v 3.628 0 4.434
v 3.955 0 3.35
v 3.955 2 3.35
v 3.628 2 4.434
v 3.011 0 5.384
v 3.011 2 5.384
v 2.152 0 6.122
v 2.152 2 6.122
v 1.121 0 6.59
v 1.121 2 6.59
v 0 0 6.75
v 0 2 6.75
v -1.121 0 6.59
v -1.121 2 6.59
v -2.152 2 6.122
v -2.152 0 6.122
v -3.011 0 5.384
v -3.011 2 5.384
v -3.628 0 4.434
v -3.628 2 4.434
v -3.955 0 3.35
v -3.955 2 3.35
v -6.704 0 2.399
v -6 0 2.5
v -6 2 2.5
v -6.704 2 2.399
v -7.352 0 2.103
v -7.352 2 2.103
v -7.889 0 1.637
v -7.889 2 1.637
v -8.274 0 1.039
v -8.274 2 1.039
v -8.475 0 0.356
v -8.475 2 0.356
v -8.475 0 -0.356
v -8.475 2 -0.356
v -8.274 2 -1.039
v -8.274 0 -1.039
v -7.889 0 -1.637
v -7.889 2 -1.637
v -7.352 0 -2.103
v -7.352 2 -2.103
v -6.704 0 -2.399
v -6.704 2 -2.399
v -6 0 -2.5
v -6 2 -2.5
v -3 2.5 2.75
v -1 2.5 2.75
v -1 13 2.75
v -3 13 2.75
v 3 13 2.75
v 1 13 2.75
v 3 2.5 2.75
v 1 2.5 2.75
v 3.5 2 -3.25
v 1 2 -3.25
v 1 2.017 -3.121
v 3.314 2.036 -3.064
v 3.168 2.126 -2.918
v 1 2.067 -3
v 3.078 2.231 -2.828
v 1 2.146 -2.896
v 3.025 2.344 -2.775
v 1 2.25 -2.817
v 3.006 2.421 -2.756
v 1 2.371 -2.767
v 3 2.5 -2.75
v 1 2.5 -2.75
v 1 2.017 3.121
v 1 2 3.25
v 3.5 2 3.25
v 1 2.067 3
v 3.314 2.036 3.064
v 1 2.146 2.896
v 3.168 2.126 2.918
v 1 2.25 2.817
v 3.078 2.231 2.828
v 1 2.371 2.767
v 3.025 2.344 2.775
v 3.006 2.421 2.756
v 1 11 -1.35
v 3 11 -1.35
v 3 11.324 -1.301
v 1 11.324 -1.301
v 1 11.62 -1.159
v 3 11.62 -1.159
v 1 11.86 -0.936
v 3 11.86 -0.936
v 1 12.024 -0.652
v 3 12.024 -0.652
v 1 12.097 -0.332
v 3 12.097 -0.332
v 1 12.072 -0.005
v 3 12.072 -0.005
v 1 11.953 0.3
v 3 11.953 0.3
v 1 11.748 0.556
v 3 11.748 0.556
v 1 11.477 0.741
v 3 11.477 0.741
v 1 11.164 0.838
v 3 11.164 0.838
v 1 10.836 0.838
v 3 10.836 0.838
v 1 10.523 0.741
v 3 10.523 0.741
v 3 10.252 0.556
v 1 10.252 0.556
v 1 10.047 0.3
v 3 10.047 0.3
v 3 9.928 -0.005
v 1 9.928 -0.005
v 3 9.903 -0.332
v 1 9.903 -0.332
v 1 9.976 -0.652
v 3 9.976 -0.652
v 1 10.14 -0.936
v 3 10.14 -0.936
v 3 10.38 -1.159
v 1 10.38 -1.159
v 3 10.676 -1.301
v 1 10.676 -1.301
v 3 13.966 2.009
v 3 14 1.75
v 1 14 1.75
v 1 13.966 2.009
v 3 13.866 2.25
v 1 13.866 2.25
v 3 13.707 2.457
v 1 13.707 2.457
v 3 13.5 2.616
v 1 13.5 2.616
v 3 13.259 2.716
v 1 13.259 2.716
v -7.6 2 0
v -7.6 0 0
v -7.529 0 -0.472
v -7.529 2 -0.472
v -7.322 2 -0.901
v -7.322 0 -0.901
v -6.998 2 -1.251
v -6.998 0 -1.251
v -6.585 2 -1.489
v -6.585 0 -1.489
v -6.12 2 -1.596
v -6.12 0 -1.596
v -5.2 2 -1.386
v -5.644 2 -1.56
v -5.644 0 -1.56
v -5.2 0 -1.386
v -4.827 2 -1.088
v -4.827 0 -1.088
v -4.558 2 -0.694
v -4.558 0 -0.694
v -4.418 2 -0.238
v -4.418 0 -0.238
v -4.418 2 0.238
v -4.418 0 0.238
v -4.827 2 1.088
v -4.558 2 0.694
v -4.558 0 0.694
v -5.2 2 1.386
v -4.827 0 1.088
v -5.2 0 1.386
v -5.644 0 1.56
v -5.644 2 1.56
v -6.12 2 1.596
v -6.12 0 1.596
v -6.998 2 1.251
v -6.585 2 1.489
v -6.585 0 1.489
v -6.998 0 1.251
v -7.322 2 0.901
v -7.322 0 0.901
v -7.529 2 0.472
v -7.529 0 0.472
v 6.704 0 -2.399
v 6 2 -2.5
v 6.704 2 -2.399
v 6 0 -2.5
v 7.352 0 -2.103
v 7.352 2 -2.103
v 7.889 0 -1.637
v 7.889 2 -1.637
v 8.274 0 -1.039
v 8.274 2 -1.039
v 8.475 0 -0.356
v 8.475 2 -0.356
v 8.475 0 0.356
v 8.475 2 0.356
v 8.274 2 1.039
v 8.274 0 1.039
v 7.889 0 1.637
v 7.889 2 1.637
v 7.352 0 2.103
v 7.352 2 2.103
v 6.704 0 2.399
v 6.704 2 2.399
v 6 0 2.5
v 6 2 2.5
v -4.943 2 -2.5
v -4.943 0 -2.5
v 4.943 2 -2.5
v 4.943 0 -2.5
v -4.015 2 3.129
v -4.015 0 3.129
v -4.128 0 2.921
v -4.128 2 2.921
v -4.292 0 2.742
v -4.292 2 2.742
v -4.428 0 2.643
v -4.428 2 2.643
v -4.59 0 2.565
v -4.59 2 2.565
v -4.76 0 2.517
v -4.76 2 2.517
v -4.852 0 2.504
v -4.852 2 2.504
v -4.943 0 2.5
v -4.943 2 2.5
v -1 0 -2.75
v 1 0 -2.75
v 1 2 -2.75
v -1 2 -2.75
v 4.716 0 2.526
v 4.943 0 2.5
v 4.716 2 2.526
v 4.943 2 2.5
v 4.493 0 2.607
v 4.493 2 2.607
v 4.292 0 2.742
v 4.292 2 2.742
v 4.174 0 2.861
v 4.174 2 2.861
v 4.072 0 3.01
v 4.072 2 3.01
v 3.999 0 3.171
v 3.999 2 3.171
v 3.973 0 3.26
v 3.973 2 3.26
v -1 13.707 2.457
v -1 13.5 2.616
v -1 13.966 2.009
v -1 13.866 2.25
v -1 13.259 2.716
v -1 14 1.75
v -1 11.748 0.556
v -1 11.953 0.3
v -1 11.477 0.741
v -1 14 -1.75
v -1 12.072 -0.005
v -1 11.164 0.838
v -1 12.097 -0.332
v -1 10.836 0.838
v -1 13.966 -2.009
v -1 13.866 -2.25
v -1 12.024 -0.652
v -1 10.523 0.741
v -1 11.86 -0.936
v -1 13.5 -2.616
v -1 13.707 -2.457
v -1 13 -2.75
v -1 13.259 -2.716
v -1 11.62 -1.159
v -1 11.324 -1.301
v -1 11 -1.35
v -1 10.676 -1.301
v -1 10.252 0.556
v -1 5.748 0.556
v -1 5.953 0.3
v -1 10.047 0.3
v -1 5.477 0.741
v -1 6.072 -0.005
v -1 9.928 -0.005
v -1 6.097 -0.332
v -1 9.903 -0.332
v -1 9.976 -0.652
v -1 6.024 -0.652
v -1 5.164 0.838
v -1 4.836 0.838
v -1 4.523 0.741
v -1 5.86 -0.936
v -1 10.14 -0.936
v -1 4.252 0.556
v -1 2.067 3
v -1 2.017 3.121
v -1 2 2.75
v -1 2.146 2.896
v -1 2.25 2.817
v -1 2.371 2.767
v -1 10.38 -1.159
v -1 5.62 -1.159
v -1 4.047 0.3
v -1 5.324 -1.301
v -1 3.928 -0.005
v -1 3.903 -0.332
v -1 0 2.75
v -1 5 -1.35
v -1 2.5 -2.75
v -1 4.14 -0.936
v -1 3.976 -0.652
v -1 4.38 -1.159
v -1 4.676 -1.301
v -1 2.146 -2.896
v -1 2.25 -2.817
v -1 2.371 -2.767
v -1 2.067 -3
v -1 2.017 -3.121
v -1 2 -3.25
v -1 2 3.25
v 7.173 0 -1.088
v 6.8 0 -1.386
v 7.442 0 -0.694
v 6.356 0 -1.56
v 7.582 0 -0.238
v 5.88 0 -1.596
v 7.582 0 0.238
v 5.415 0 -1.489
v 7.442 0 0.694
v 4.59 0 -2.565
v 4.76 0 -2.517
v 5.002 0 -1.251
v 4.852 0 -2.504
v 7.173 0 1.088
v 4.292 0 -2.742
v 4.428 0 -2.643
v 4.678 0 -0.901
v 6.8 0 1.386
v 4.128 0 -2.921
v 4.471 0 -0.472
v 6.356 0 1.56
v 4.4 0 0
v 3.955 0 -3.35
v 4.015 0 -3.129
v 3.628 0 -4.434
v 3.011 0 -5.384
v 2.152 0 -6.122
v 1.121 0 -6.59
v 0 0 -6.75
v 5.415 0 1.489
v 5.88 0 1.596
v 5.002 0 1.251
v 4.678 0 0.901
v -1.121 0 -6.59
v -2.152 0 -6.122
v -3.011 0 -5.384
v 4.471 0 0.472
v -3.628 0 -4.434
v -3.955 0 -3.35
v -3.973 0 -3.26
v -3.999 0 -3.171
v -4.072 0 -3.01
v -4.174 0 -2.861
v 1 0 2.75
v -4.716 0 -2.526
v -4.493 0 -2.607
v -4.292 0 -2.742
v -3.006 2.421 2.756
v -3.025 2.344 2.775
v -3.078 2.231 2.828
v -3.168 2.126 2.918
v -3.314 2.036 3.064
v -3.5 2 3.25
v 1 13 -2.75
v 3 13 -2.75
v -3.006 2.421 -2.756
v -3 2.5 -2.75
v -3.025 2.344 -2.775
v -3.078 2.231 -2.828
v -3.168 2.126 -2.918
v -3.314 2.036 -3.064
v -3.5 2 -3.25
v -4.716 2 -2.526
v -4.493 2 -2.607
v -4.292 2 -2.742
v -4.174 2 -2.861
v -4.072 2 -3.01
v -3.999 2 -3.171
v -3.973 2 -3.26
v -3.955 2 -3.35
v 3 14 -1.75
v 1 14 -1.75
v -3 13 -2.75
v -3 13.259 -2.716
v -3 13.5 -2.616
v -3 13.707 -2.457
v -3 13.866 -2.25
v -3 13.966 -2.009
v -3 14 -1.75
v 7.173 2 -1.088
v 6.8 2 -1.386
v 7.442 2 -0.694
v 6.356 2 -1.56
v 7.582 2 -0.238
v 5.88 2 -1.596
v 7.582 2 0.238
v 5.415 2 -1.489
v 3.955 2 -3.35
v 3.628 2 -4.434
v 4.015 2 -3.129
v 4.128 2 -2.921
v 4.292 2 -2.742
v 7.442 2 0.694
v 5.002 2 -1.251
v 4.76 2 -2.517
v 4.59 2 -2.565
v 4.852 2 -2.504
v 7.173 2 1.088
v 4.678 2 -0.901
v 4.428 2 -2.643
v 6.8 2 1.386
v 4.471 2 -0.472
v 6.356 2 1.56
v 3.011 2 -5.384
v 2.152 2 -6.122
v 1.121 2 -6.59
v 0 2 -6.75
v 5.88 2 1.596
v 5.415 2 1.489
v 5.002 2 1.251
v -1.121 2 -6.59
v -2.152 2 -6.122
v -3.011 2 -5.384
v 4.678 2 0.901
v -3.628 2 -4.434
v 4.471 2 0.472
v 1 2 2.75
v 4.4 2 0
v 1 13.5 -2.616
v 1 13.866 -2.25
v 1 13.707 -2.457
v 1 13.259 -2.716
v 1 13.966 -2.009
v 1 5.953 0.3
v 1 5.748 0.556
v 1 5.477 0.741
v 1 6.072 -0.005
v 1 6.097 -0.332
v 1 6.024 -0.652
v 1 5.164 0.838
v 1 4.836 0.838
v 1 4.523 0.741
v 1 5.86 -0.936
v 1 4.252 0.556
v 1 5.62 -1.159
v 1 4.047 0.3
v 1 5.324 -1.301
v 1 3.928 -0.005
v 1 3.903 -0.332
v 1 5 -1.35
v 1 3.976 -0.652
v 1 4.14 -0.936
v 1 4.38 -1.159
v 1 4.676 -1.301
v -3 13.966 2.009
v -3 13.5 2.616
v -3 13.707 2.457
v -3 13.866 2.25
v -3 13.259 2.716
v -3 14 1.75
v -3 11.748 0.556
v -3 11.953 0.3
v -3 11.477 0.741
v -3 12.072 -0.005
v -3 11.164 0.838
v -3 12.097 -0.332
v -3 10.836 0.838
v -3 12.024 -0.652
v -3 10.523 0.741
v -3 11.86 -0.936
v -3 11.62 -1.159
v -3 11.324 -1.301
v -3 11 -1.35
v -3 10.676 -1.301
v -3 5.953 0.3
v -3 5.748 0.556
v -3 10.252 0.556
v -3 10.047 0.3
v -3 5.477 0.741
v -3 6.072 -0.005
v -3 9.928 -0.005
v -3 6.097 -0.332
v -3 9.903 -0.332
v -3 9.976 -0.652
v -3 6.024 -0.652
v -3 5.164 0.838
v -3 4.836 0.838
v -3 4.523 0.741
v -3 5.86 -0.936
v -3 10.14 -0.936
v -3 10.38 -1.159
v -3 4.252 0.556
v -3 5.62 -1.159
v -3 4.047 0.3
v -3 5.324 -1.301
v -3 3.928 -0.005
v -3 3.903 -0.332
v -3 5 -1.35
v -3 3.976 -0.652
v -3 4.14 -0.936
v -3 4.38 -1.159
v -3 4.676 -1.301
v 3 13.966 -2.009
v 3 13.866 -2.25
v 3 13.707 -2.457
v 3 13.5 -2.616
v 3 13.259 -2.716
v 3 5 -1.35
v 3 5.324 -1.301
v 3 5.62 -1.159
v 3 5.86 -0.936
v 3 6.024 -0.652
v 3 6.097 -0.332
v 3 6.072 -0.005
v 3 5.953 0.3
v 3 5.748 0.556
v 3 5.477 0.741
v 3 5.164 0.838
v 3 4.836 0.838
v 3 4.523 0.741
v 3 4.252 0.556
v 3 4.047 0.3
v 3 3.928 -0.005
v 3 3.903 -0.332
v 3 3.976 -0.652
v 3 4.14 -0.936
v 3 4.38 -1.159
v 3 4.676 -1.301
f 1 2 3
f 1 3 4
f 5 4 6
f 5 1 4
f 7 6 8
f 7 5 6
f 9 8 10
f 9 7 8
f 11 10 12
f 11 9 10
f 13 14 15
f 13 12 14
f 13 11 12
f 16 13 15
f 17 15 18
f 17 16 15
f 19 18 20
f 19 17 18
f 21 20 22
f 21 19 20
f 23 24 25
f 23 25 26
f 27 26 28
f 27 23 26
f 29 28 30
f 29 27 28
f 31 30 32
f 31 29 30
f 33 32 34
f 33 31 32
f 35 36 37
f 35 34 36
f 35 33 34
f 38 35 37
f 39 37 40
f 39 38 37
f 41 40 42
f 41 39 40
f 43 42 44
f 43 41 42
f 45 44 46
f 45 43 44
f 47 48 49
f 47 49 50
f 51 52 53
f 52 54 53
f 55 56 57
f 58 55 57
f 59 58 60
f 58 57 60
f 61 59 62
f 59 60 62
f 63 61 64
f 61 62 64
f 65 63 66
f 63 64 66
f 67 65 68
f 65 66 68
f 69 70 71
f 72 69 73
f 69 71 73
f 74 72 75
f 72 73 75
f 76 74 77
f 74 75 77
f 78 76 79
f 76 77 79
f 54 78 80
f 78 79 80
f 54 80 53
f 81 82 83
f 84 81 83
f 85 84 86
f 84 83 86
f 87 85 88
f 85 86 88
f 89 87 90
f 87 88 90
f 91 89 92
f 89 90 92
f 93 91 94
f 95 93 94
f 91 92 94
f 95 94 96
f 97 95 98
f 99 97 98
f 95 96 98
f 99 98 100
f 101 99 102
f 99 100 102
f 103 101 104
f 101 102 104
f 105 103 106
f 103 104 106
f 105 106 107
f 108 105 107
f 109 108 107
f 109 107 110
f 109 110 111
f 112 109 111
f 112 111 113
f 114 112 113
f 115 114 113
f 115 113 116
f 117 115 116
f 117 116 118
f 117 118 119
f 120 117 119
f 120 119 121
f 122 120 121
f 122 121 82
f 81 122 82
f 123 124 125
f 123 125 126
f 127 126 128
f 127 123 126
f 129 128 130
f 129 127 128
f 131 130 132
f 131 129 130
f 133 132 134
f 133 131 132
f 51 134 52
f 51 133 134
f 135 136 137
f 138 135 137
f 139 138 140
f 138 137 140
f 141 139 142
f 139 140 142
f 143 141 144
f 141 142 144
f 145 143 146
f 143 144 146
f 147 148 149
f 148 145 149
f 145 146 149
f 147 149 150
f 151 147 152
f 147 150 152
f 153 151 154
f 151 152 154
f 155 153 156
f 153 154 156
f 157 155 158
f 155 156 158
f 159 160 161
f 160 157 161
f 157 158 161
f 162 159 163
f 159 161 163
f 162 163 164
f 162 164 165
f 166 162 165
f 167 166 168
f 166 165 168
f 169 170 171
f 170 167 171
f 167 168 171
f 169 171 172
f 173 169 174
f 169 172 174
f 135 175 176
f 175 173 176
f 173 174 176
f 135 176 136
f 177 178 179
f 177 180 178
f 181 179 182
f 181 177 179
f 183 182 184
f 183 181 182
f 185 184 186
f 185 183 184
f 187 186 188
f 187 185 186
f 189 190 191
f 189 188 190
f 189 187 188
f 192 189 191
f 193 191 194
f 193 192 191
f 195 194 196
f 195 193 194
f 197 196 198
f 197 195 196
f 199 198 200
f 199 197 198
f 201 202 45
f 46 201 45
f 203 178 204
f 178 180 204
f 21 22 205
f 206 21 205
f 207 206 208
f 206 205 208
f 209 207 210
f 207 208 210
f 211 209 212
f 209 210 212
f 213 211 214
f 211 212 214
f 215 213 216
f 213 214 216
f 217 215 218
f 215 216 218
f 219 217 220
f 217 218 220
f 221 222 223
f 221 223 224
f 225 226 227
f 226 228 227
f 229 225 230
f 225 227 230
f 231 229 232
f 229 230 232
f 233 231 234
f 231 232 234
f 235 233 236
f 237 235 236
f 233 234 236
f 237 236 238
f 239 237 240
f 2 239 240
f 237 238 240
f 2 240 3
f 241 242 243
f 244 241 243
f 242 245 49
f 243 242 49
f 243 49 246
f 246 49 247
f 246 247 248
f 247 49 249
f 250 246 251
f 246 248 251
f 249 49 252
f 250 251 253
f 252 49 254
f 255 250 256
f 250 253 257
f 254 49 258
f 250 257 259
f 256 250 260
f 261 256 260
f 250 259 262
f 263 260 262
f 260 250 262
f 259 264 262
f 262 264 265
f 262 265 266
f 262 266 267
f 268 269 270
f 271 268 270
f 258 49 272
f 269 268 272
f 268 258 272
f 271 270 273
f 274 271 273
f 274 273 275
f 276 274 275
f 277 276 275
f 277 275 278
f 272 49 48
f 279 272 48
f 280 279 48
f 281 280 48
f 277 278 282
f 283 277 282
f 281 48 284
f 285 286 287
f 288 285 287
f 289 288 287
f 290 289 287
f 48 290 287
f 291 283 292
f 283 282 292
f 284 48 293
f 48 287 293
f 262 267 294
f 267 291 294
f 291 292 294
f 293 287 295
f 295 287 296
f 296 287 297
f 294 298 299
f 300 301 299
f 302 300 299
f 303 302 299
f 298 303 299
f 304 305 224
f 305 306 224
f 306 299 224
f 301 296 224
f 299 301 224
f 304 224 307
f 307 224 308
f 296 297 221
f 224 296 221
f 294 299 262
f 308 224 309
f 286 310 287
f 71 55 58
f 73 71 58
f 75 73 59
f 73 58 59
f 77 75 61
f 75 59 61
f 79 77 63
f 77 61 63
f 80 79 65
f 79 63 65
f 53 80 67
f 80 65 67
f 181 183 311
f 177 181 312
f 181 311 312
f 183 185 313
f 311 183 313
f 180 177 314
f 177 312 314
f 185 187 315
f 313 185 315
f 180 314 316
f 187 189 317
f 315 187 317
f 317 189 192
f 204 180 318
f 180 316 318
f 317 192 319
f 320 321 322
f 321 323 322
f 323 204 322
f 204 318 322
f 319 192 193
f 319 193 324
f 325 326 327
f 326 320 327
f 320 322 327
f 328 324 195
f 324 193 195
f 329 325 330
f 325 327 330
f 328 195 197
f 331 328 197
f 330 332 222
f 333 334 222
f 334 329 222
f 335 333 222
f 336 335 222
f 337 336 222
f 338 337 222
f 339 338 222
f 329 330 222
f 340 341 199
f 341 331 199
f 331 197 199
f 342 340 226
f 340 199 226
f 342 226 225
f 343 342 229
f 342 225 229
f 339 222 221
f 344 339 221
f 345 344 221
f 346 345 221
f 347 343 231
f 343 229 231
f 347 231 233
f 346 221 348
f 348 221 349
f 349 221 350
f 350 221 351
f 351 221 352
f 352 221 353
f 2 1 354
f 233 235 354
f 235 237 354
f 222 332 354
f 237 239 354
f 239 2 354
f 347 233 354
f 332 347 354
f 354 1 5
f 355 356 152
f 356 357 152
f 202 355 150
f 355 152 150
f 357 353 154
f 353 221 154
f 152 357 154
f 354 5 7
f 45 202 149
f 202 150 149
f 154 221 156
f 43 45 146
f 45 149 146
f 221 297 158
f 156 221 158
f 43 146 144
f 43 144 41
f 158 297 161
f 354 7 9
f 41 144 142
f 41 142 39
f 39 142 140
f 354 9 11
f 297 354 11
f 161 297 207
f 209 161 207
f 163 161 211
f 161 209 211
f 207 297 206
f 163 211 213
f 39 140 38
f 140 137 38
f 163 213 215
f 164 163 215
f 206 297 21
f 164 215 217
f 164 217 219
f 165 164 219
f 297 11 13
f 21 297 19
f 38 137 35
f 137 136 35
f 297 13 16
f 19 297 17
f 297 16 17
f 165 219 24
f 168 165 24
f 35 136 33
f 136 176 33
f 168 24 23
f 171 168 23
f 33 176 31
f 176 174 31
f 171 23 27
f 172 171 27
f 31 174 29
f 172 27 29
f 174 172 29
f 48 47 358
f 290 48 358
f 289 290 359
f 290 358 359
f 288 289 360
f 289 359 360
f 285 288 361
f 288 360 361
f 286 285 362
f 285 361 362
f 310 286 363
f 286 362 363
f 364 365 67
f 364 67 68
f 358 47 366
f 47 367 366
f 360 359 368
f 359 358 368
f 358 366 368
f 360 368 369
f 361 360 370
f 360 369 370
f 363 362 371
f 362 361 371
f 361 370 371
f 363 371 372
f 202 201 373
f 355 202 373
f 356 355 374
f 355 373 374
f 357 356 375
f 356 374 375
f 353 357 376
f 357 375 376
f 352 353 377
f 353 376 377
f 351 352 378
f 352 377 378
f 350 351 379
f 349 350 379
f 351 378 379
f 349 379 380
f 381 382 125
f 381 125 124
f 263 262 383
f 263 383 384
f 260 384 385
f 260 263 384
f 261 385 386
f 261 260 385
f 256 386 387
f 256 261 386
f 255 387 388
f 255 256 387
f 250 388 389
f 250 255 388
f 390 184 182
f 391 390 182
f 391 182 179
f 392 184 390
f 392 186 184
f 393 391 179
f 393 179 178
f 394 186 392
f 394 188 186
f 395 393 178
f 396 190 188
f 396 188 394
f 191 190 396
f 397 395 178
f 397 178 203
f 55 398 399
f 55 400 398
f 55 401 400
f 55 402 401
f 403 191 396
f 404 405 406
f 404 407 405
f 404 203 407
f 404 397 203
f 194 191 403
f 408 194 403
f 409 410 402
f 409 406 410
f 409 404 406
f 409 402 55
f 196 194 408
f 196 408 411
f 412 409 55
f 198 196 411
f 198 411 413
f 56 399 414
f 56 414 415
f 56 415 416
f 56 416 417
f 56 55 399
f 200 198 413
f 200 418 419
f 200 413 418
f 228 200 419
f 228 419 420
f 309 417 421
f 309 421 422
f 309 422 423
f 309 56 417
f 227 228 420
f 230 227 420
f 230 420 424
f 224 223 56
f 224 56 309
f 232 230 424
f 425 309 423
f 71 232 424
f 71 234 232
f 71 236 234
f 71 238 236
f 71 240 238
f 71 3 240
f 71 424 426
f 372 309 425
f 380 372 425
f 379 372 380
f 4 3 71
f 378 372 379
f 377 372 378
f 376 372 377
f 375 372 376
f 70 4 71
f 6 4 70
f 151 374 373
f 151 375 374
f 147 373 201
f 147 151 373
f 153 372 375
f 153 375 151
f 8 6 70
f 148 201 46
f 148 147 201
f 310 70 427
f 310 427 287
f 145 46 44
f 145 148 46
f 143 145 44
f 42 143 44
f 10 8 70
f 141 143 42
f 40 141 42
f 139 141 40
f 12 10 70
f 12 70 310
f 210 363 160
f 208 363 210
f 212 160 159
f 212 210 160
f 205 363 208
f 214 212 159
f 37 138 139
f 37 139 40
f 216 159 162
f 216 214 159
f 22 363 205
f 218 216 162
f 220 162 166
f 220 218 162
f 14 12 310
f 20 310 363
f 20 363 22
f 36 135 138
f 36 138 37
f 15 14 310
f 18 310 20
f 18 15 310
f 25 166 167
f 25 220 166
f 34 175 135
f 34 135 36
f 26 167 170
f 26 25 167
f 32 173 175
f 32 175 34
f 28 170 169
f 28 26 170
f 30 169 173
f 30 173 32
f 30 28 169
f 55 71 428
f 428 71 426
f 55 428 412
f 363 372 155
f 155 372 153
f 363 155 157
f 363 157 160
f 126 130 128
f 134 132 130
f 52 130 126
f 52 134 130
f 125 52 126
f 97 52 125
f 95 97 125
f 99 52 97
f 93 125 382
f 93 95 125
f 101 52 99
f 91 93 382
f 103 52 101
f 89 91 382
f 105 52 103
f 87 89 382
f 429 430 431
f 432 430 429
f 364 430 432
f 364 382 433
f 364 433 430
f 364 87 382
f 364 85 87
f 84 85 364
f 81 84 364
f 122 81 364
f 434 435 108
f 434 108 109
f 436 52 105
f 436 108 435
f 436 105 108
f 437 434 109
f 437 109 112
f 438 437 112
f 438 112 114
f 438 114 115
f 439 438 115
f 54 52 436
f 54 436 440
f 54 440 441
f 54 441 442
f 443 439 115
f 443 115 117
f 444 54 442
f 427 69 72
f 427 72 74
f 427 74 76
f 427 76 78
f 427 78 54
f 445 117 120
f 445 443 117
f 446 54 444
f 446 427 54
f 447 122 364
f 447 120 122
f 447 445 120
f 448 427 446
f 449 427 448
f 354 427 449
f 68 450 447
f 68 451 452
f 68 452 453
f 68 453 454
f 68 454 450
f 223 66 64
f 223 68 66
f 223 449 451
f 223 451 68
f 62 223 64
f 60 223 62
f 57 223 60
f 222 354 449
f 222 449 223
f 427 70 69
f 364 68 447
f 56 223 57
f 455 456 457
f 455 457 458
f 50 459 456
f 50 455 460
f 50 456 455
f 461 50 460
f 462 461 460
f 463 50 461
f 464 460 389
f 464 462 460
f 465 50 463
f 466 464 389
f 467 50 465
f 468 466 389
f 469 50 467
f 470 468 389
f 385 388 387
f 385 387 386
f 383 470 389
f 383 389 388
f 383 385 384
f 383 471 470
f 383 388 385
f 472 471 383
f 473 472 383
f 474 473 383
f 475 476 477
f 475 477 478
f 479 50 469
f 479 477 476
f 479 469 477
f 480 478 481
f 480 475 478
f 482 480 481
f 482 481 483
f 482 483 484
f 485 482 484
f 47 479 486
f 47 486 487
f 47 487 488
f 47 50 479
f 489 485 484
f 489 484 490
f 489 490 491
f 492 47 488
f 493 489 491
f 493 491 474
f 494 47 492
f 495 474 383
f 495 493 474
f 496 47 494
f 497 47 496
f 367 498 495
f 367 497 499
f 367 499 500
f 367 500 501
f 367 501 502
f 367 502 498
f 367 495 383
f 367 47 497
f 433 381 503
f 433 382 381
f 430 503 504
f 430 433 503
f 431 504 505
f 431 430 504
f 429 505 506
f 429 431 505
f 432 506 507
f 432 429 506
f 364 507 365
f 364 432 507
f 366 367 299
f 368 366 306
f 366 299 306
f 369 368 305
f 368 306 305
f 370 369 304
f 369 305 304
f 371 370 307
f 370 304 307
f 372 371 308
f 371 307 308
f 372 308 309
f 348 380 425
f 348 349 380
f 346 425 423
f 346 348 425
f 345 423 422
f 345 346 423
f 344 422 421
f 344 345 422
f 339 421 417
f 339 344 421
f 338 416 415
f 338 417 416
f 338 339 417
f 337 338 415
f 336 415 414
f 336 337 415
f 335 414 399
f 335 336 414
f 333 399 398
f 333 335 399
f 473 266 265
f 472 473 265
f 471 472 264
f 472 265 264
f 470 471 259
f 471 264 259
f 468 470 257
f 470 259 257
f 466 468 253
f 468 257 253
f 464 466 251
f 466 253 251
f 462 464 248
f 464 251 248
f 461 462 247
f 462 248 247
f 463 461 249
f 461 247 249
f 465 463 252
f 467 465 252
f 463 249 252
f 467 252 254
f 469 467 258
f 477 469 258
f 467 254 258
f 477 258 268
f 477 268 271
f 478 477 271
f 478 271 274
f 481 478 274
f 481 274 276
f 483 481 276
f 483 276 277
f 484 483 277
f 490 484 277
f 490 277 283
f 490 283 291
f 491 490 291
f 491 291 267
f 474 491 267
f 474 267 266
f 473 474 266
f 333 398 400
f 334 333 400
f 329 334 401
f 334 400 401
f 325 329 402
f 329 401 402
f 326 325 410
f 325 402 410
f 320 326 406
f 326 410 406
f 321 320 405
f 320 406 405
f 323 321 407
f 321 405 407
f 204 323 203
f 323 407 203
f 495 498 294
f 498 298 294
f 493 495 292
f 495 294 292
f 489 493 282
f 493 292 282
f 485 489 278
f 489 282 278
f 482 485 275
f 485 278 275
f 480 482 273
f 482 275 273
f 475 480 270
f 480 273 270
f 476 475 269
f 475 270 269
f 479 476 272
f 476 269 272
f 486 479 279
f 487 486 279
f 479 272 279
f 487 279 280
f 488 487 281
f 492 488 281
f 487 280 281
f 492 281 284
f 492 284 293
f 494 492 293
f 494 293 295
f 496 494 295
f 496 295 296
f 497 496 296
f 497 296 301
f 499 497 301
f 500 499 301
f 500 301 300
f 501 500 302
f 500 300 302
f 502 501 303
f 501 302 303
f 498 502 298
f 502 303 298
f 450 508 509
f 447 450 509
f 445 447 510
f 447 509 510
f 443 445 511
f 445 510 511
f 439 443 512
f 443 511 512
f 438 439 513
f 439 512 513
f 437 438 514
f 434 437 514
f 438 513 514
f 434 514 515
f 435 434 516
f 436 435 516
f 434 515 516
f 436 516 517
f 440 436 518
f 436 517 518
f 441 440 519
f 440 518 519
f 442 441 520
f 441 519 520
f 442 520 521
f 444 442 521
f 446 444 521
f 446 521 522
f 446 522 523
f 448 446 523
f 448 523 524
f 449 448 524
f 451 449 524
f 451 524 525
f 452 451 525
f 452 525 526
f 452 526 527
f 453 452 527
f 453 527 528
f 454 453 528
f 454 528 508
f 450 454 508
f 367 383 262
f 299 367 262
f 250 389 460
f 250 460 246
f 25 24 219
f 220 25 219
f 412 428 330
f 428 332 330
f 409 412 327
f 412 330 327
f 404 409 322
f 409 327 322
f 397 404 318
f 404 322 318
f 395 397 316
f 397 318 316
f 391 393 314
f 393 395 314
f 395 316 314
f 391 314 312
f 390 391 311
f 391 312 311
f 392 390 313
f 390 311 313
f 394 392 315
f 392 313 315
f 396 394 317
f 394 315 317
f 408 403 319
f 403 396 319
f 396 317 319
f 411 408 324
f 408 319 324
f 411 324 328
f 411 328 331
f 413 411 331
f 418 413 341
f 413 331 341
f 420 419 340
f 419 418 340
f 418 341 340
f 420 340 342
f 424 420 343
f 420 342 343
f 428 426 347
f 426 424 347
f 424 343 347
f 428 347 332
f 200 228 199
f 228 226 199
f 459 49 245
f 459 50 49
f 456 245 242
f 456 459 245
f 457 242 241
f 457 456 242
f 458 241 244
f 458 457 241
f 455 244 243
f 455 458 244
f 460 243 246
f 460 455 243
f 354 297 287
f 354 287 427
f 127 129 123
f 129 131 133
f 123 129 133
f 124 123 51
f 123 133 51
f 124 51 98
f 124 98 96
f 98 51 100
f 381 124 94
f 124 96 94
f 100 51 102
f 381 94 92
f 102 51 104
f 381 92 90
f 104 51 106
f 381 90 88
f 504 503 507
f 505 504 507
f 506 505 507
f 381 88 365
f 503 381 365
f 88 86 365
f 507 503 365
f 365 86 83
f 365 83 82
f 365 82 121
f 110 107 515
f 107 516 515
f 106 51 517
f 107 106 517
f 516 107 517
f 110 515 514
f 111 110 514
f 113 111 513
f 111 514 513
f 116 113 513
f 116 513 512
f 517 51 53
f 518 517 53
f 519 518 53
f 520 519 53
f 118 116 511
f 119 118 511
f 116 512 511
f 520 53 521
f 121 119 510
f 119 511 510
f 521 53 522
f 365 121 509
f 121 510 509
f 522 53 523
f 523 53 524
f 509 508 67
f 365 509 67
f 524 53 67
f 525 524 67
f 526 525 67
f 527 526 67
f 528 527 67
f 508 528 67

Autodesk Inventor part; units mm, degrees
ref_plane "YZ Plane" through (0, 0, 0) normal (1, 0, 0) x (0, 1, 0)
ref_plane "XZ Plane" through (0, 0, 0) normal (0, 1, 0) x (-1, 0, 0)
ref_plane "XY Plane" through (0, 0, 0) normal (0, 0, 1) x (1, 0, 0)
sketch "Sketch1" plane through (0, 0, 0) normal (0, 1, 0) x (-1, 0, 0)
  circle A0 centre (6, 0) radius 1.6
  circle A1 centre (6, 0) radius 1.6
  circle A2 centre (-6, 0) radius 1.6
  circle A3 centre (-6, 0) radius 1.6
  line L0 (1, 2.75) -> (1, -2.75) construction
  line L1 (1, 2.75) -> (-1, 2.75)
  line L2 (-1, -2.75) -> (-1, 2.75) construction
  line L3 (-1, -2.75) -> (1, -2.75)
  line L4 (0, 2.75) -> (0, -2.75) construction
  line L5 (-1, -2.75) -> (-3, -2.75)
  line L6 (-3, -2.75) -> (-3, 2.75)
  line L7 (-3, 2.75) -> (-1, 2.75)
  line L8 (-1, 2.75) -> (-1, -2.75)
  line L9 (1, -2.75) -> (3, -2.75)
  line L10 (3, -2.75) -> (3, 2.75)
  line L11 (3, 2.75) -> (1, 2.75)
  line L12 (1, 2.75) -> (1, -2.75)
  line L13 (6, 0) -> (-6, 0) construction
  arc A4 (6, -2.5) -> (6, 2.5) centre (6, 0) ccw
  arc A5 (-6, 2.5) -> (-6, -2.5) centre (-6, 0) ccw
  line L14 (0, 2.75) -> (0, -2.75) construction
  arc A6 (4, 2.75) -> (-4, 2.75) centre (0, 2.75) ccw
  arc A7 (-4, -2.75) -> (4, -2.75) centre (0, -2.75) ccw
  line L15 (4, -2.75) -> (4, -2.5)
  line L16 (4, 2.5) -> (4, 2.75)
  line L17 (-4, 2.75) -> (-4, 2.5)
  line L18 (-4, -2.5) -> (-4, -2.75)
  line L19 (-6, -2.5) -> (-4, -2.5)
  line L20 (4, -2.5) -> (6, -2.5)
  line L21 (6, 2.5) -> (4, 2.5)
  line L22 (-4, 2.5) -> (-6, 2.5)
  point P0 (0, 0)
  point P1 (0, 0)
  point P2 (0, 0)
  point P3 (0, 0)
  point P4 (0, 0)
  point P5 (0, 0)
  dimension "d6" = 2
  dimension "d7" = 2
  dimension "d8" = 5
  dimension "d9" = 8
extrude "Extrusion1" add sketch "Sketch1" along normal blind 2 contours L11 L10 L9 L12 | L8 L5 L6 L7 | L20 L15 A7 L18 L19 A5 L22 L17 A6 L16 L21 A4
fillet "Fillet1" radius 1 4 edges at (4, 1, -2.5) (4, 1, 2.5) (-4, 1, -2.5) (-4, 1, 2.5)
sketch "Sketch3" plane through (0, 2, 0) normal (0, 1, 0) x (1, 0, 0)
  line L0 (1, -2.75) -> (-1, -2.75) projected
  line L1 (1, -2.75) -> (3, -2.75)
  line L2 (3, -2.75) -> (3, 2.75)
  line L3 (3, 2.75) -> (1, 2.75)
  line L4 (1, 2.75) -> (1, -2.75)
  line L5 (-1, -2.75) -> (-3, -2.75)
  line L6 (-3, -2.75) -> (-3, 2.75)
  line L7 (-3, 2.75) -> (-1, 2.75)
  line L8 (-1, 2.75) -> (-1, -2.75)
  point P0 (0, 0)
  dimension "d11" = 2
  dimension "d12" = 5.5
  dimension "d13" = 2
extrude "Extrusion2" add sketch "Sketch3" along normal blind 12
fillet "Fillet2" radius 0.5 6 edges at (2, 2, -2.75) (-2, 2, -2.75) (-3, 2, 0) (3, 2, 0) (2, 2, 2.75) (-2, 2, 2.75)
sketch "Sketch4" plane through (3, 14, 2.75) normal (1, 0, 0) x (0, 0, -1)
  line L0 (5.5, 0) -> (0.5, 0) construction
  line L1 (5.5, -12) -> (5.5, 0) construction
  line L2 (0.5, 0) -> (5.5, -12) construction
  line L3 (3, -6) -> (3, -9) construction
  line L4 (3, -6) -> (3.9934, -6) construction
  circle A0 centre (3, -9) radius 1.1
  circle A1 centre (3, -3) radius 1.1
  line L5 (0, 0) -> (5.5, 0) projected
  point P0 (2.75, -14)
  point P1 (52.5, -13.5)
  dimension "d17" = 3
  dimension "d18" = 2.2
extrude "Extrusion3" cut sketch "Sketch4" against normal blind 12
fillet "Fillet3" radius 1 4 edges at (2, 14, -2.75) (-2, 14, -2.75) (2, 14, 2.75) (-2, 14, 2.75)
properties part number "CarbonConnectorStabPCBConnector"
